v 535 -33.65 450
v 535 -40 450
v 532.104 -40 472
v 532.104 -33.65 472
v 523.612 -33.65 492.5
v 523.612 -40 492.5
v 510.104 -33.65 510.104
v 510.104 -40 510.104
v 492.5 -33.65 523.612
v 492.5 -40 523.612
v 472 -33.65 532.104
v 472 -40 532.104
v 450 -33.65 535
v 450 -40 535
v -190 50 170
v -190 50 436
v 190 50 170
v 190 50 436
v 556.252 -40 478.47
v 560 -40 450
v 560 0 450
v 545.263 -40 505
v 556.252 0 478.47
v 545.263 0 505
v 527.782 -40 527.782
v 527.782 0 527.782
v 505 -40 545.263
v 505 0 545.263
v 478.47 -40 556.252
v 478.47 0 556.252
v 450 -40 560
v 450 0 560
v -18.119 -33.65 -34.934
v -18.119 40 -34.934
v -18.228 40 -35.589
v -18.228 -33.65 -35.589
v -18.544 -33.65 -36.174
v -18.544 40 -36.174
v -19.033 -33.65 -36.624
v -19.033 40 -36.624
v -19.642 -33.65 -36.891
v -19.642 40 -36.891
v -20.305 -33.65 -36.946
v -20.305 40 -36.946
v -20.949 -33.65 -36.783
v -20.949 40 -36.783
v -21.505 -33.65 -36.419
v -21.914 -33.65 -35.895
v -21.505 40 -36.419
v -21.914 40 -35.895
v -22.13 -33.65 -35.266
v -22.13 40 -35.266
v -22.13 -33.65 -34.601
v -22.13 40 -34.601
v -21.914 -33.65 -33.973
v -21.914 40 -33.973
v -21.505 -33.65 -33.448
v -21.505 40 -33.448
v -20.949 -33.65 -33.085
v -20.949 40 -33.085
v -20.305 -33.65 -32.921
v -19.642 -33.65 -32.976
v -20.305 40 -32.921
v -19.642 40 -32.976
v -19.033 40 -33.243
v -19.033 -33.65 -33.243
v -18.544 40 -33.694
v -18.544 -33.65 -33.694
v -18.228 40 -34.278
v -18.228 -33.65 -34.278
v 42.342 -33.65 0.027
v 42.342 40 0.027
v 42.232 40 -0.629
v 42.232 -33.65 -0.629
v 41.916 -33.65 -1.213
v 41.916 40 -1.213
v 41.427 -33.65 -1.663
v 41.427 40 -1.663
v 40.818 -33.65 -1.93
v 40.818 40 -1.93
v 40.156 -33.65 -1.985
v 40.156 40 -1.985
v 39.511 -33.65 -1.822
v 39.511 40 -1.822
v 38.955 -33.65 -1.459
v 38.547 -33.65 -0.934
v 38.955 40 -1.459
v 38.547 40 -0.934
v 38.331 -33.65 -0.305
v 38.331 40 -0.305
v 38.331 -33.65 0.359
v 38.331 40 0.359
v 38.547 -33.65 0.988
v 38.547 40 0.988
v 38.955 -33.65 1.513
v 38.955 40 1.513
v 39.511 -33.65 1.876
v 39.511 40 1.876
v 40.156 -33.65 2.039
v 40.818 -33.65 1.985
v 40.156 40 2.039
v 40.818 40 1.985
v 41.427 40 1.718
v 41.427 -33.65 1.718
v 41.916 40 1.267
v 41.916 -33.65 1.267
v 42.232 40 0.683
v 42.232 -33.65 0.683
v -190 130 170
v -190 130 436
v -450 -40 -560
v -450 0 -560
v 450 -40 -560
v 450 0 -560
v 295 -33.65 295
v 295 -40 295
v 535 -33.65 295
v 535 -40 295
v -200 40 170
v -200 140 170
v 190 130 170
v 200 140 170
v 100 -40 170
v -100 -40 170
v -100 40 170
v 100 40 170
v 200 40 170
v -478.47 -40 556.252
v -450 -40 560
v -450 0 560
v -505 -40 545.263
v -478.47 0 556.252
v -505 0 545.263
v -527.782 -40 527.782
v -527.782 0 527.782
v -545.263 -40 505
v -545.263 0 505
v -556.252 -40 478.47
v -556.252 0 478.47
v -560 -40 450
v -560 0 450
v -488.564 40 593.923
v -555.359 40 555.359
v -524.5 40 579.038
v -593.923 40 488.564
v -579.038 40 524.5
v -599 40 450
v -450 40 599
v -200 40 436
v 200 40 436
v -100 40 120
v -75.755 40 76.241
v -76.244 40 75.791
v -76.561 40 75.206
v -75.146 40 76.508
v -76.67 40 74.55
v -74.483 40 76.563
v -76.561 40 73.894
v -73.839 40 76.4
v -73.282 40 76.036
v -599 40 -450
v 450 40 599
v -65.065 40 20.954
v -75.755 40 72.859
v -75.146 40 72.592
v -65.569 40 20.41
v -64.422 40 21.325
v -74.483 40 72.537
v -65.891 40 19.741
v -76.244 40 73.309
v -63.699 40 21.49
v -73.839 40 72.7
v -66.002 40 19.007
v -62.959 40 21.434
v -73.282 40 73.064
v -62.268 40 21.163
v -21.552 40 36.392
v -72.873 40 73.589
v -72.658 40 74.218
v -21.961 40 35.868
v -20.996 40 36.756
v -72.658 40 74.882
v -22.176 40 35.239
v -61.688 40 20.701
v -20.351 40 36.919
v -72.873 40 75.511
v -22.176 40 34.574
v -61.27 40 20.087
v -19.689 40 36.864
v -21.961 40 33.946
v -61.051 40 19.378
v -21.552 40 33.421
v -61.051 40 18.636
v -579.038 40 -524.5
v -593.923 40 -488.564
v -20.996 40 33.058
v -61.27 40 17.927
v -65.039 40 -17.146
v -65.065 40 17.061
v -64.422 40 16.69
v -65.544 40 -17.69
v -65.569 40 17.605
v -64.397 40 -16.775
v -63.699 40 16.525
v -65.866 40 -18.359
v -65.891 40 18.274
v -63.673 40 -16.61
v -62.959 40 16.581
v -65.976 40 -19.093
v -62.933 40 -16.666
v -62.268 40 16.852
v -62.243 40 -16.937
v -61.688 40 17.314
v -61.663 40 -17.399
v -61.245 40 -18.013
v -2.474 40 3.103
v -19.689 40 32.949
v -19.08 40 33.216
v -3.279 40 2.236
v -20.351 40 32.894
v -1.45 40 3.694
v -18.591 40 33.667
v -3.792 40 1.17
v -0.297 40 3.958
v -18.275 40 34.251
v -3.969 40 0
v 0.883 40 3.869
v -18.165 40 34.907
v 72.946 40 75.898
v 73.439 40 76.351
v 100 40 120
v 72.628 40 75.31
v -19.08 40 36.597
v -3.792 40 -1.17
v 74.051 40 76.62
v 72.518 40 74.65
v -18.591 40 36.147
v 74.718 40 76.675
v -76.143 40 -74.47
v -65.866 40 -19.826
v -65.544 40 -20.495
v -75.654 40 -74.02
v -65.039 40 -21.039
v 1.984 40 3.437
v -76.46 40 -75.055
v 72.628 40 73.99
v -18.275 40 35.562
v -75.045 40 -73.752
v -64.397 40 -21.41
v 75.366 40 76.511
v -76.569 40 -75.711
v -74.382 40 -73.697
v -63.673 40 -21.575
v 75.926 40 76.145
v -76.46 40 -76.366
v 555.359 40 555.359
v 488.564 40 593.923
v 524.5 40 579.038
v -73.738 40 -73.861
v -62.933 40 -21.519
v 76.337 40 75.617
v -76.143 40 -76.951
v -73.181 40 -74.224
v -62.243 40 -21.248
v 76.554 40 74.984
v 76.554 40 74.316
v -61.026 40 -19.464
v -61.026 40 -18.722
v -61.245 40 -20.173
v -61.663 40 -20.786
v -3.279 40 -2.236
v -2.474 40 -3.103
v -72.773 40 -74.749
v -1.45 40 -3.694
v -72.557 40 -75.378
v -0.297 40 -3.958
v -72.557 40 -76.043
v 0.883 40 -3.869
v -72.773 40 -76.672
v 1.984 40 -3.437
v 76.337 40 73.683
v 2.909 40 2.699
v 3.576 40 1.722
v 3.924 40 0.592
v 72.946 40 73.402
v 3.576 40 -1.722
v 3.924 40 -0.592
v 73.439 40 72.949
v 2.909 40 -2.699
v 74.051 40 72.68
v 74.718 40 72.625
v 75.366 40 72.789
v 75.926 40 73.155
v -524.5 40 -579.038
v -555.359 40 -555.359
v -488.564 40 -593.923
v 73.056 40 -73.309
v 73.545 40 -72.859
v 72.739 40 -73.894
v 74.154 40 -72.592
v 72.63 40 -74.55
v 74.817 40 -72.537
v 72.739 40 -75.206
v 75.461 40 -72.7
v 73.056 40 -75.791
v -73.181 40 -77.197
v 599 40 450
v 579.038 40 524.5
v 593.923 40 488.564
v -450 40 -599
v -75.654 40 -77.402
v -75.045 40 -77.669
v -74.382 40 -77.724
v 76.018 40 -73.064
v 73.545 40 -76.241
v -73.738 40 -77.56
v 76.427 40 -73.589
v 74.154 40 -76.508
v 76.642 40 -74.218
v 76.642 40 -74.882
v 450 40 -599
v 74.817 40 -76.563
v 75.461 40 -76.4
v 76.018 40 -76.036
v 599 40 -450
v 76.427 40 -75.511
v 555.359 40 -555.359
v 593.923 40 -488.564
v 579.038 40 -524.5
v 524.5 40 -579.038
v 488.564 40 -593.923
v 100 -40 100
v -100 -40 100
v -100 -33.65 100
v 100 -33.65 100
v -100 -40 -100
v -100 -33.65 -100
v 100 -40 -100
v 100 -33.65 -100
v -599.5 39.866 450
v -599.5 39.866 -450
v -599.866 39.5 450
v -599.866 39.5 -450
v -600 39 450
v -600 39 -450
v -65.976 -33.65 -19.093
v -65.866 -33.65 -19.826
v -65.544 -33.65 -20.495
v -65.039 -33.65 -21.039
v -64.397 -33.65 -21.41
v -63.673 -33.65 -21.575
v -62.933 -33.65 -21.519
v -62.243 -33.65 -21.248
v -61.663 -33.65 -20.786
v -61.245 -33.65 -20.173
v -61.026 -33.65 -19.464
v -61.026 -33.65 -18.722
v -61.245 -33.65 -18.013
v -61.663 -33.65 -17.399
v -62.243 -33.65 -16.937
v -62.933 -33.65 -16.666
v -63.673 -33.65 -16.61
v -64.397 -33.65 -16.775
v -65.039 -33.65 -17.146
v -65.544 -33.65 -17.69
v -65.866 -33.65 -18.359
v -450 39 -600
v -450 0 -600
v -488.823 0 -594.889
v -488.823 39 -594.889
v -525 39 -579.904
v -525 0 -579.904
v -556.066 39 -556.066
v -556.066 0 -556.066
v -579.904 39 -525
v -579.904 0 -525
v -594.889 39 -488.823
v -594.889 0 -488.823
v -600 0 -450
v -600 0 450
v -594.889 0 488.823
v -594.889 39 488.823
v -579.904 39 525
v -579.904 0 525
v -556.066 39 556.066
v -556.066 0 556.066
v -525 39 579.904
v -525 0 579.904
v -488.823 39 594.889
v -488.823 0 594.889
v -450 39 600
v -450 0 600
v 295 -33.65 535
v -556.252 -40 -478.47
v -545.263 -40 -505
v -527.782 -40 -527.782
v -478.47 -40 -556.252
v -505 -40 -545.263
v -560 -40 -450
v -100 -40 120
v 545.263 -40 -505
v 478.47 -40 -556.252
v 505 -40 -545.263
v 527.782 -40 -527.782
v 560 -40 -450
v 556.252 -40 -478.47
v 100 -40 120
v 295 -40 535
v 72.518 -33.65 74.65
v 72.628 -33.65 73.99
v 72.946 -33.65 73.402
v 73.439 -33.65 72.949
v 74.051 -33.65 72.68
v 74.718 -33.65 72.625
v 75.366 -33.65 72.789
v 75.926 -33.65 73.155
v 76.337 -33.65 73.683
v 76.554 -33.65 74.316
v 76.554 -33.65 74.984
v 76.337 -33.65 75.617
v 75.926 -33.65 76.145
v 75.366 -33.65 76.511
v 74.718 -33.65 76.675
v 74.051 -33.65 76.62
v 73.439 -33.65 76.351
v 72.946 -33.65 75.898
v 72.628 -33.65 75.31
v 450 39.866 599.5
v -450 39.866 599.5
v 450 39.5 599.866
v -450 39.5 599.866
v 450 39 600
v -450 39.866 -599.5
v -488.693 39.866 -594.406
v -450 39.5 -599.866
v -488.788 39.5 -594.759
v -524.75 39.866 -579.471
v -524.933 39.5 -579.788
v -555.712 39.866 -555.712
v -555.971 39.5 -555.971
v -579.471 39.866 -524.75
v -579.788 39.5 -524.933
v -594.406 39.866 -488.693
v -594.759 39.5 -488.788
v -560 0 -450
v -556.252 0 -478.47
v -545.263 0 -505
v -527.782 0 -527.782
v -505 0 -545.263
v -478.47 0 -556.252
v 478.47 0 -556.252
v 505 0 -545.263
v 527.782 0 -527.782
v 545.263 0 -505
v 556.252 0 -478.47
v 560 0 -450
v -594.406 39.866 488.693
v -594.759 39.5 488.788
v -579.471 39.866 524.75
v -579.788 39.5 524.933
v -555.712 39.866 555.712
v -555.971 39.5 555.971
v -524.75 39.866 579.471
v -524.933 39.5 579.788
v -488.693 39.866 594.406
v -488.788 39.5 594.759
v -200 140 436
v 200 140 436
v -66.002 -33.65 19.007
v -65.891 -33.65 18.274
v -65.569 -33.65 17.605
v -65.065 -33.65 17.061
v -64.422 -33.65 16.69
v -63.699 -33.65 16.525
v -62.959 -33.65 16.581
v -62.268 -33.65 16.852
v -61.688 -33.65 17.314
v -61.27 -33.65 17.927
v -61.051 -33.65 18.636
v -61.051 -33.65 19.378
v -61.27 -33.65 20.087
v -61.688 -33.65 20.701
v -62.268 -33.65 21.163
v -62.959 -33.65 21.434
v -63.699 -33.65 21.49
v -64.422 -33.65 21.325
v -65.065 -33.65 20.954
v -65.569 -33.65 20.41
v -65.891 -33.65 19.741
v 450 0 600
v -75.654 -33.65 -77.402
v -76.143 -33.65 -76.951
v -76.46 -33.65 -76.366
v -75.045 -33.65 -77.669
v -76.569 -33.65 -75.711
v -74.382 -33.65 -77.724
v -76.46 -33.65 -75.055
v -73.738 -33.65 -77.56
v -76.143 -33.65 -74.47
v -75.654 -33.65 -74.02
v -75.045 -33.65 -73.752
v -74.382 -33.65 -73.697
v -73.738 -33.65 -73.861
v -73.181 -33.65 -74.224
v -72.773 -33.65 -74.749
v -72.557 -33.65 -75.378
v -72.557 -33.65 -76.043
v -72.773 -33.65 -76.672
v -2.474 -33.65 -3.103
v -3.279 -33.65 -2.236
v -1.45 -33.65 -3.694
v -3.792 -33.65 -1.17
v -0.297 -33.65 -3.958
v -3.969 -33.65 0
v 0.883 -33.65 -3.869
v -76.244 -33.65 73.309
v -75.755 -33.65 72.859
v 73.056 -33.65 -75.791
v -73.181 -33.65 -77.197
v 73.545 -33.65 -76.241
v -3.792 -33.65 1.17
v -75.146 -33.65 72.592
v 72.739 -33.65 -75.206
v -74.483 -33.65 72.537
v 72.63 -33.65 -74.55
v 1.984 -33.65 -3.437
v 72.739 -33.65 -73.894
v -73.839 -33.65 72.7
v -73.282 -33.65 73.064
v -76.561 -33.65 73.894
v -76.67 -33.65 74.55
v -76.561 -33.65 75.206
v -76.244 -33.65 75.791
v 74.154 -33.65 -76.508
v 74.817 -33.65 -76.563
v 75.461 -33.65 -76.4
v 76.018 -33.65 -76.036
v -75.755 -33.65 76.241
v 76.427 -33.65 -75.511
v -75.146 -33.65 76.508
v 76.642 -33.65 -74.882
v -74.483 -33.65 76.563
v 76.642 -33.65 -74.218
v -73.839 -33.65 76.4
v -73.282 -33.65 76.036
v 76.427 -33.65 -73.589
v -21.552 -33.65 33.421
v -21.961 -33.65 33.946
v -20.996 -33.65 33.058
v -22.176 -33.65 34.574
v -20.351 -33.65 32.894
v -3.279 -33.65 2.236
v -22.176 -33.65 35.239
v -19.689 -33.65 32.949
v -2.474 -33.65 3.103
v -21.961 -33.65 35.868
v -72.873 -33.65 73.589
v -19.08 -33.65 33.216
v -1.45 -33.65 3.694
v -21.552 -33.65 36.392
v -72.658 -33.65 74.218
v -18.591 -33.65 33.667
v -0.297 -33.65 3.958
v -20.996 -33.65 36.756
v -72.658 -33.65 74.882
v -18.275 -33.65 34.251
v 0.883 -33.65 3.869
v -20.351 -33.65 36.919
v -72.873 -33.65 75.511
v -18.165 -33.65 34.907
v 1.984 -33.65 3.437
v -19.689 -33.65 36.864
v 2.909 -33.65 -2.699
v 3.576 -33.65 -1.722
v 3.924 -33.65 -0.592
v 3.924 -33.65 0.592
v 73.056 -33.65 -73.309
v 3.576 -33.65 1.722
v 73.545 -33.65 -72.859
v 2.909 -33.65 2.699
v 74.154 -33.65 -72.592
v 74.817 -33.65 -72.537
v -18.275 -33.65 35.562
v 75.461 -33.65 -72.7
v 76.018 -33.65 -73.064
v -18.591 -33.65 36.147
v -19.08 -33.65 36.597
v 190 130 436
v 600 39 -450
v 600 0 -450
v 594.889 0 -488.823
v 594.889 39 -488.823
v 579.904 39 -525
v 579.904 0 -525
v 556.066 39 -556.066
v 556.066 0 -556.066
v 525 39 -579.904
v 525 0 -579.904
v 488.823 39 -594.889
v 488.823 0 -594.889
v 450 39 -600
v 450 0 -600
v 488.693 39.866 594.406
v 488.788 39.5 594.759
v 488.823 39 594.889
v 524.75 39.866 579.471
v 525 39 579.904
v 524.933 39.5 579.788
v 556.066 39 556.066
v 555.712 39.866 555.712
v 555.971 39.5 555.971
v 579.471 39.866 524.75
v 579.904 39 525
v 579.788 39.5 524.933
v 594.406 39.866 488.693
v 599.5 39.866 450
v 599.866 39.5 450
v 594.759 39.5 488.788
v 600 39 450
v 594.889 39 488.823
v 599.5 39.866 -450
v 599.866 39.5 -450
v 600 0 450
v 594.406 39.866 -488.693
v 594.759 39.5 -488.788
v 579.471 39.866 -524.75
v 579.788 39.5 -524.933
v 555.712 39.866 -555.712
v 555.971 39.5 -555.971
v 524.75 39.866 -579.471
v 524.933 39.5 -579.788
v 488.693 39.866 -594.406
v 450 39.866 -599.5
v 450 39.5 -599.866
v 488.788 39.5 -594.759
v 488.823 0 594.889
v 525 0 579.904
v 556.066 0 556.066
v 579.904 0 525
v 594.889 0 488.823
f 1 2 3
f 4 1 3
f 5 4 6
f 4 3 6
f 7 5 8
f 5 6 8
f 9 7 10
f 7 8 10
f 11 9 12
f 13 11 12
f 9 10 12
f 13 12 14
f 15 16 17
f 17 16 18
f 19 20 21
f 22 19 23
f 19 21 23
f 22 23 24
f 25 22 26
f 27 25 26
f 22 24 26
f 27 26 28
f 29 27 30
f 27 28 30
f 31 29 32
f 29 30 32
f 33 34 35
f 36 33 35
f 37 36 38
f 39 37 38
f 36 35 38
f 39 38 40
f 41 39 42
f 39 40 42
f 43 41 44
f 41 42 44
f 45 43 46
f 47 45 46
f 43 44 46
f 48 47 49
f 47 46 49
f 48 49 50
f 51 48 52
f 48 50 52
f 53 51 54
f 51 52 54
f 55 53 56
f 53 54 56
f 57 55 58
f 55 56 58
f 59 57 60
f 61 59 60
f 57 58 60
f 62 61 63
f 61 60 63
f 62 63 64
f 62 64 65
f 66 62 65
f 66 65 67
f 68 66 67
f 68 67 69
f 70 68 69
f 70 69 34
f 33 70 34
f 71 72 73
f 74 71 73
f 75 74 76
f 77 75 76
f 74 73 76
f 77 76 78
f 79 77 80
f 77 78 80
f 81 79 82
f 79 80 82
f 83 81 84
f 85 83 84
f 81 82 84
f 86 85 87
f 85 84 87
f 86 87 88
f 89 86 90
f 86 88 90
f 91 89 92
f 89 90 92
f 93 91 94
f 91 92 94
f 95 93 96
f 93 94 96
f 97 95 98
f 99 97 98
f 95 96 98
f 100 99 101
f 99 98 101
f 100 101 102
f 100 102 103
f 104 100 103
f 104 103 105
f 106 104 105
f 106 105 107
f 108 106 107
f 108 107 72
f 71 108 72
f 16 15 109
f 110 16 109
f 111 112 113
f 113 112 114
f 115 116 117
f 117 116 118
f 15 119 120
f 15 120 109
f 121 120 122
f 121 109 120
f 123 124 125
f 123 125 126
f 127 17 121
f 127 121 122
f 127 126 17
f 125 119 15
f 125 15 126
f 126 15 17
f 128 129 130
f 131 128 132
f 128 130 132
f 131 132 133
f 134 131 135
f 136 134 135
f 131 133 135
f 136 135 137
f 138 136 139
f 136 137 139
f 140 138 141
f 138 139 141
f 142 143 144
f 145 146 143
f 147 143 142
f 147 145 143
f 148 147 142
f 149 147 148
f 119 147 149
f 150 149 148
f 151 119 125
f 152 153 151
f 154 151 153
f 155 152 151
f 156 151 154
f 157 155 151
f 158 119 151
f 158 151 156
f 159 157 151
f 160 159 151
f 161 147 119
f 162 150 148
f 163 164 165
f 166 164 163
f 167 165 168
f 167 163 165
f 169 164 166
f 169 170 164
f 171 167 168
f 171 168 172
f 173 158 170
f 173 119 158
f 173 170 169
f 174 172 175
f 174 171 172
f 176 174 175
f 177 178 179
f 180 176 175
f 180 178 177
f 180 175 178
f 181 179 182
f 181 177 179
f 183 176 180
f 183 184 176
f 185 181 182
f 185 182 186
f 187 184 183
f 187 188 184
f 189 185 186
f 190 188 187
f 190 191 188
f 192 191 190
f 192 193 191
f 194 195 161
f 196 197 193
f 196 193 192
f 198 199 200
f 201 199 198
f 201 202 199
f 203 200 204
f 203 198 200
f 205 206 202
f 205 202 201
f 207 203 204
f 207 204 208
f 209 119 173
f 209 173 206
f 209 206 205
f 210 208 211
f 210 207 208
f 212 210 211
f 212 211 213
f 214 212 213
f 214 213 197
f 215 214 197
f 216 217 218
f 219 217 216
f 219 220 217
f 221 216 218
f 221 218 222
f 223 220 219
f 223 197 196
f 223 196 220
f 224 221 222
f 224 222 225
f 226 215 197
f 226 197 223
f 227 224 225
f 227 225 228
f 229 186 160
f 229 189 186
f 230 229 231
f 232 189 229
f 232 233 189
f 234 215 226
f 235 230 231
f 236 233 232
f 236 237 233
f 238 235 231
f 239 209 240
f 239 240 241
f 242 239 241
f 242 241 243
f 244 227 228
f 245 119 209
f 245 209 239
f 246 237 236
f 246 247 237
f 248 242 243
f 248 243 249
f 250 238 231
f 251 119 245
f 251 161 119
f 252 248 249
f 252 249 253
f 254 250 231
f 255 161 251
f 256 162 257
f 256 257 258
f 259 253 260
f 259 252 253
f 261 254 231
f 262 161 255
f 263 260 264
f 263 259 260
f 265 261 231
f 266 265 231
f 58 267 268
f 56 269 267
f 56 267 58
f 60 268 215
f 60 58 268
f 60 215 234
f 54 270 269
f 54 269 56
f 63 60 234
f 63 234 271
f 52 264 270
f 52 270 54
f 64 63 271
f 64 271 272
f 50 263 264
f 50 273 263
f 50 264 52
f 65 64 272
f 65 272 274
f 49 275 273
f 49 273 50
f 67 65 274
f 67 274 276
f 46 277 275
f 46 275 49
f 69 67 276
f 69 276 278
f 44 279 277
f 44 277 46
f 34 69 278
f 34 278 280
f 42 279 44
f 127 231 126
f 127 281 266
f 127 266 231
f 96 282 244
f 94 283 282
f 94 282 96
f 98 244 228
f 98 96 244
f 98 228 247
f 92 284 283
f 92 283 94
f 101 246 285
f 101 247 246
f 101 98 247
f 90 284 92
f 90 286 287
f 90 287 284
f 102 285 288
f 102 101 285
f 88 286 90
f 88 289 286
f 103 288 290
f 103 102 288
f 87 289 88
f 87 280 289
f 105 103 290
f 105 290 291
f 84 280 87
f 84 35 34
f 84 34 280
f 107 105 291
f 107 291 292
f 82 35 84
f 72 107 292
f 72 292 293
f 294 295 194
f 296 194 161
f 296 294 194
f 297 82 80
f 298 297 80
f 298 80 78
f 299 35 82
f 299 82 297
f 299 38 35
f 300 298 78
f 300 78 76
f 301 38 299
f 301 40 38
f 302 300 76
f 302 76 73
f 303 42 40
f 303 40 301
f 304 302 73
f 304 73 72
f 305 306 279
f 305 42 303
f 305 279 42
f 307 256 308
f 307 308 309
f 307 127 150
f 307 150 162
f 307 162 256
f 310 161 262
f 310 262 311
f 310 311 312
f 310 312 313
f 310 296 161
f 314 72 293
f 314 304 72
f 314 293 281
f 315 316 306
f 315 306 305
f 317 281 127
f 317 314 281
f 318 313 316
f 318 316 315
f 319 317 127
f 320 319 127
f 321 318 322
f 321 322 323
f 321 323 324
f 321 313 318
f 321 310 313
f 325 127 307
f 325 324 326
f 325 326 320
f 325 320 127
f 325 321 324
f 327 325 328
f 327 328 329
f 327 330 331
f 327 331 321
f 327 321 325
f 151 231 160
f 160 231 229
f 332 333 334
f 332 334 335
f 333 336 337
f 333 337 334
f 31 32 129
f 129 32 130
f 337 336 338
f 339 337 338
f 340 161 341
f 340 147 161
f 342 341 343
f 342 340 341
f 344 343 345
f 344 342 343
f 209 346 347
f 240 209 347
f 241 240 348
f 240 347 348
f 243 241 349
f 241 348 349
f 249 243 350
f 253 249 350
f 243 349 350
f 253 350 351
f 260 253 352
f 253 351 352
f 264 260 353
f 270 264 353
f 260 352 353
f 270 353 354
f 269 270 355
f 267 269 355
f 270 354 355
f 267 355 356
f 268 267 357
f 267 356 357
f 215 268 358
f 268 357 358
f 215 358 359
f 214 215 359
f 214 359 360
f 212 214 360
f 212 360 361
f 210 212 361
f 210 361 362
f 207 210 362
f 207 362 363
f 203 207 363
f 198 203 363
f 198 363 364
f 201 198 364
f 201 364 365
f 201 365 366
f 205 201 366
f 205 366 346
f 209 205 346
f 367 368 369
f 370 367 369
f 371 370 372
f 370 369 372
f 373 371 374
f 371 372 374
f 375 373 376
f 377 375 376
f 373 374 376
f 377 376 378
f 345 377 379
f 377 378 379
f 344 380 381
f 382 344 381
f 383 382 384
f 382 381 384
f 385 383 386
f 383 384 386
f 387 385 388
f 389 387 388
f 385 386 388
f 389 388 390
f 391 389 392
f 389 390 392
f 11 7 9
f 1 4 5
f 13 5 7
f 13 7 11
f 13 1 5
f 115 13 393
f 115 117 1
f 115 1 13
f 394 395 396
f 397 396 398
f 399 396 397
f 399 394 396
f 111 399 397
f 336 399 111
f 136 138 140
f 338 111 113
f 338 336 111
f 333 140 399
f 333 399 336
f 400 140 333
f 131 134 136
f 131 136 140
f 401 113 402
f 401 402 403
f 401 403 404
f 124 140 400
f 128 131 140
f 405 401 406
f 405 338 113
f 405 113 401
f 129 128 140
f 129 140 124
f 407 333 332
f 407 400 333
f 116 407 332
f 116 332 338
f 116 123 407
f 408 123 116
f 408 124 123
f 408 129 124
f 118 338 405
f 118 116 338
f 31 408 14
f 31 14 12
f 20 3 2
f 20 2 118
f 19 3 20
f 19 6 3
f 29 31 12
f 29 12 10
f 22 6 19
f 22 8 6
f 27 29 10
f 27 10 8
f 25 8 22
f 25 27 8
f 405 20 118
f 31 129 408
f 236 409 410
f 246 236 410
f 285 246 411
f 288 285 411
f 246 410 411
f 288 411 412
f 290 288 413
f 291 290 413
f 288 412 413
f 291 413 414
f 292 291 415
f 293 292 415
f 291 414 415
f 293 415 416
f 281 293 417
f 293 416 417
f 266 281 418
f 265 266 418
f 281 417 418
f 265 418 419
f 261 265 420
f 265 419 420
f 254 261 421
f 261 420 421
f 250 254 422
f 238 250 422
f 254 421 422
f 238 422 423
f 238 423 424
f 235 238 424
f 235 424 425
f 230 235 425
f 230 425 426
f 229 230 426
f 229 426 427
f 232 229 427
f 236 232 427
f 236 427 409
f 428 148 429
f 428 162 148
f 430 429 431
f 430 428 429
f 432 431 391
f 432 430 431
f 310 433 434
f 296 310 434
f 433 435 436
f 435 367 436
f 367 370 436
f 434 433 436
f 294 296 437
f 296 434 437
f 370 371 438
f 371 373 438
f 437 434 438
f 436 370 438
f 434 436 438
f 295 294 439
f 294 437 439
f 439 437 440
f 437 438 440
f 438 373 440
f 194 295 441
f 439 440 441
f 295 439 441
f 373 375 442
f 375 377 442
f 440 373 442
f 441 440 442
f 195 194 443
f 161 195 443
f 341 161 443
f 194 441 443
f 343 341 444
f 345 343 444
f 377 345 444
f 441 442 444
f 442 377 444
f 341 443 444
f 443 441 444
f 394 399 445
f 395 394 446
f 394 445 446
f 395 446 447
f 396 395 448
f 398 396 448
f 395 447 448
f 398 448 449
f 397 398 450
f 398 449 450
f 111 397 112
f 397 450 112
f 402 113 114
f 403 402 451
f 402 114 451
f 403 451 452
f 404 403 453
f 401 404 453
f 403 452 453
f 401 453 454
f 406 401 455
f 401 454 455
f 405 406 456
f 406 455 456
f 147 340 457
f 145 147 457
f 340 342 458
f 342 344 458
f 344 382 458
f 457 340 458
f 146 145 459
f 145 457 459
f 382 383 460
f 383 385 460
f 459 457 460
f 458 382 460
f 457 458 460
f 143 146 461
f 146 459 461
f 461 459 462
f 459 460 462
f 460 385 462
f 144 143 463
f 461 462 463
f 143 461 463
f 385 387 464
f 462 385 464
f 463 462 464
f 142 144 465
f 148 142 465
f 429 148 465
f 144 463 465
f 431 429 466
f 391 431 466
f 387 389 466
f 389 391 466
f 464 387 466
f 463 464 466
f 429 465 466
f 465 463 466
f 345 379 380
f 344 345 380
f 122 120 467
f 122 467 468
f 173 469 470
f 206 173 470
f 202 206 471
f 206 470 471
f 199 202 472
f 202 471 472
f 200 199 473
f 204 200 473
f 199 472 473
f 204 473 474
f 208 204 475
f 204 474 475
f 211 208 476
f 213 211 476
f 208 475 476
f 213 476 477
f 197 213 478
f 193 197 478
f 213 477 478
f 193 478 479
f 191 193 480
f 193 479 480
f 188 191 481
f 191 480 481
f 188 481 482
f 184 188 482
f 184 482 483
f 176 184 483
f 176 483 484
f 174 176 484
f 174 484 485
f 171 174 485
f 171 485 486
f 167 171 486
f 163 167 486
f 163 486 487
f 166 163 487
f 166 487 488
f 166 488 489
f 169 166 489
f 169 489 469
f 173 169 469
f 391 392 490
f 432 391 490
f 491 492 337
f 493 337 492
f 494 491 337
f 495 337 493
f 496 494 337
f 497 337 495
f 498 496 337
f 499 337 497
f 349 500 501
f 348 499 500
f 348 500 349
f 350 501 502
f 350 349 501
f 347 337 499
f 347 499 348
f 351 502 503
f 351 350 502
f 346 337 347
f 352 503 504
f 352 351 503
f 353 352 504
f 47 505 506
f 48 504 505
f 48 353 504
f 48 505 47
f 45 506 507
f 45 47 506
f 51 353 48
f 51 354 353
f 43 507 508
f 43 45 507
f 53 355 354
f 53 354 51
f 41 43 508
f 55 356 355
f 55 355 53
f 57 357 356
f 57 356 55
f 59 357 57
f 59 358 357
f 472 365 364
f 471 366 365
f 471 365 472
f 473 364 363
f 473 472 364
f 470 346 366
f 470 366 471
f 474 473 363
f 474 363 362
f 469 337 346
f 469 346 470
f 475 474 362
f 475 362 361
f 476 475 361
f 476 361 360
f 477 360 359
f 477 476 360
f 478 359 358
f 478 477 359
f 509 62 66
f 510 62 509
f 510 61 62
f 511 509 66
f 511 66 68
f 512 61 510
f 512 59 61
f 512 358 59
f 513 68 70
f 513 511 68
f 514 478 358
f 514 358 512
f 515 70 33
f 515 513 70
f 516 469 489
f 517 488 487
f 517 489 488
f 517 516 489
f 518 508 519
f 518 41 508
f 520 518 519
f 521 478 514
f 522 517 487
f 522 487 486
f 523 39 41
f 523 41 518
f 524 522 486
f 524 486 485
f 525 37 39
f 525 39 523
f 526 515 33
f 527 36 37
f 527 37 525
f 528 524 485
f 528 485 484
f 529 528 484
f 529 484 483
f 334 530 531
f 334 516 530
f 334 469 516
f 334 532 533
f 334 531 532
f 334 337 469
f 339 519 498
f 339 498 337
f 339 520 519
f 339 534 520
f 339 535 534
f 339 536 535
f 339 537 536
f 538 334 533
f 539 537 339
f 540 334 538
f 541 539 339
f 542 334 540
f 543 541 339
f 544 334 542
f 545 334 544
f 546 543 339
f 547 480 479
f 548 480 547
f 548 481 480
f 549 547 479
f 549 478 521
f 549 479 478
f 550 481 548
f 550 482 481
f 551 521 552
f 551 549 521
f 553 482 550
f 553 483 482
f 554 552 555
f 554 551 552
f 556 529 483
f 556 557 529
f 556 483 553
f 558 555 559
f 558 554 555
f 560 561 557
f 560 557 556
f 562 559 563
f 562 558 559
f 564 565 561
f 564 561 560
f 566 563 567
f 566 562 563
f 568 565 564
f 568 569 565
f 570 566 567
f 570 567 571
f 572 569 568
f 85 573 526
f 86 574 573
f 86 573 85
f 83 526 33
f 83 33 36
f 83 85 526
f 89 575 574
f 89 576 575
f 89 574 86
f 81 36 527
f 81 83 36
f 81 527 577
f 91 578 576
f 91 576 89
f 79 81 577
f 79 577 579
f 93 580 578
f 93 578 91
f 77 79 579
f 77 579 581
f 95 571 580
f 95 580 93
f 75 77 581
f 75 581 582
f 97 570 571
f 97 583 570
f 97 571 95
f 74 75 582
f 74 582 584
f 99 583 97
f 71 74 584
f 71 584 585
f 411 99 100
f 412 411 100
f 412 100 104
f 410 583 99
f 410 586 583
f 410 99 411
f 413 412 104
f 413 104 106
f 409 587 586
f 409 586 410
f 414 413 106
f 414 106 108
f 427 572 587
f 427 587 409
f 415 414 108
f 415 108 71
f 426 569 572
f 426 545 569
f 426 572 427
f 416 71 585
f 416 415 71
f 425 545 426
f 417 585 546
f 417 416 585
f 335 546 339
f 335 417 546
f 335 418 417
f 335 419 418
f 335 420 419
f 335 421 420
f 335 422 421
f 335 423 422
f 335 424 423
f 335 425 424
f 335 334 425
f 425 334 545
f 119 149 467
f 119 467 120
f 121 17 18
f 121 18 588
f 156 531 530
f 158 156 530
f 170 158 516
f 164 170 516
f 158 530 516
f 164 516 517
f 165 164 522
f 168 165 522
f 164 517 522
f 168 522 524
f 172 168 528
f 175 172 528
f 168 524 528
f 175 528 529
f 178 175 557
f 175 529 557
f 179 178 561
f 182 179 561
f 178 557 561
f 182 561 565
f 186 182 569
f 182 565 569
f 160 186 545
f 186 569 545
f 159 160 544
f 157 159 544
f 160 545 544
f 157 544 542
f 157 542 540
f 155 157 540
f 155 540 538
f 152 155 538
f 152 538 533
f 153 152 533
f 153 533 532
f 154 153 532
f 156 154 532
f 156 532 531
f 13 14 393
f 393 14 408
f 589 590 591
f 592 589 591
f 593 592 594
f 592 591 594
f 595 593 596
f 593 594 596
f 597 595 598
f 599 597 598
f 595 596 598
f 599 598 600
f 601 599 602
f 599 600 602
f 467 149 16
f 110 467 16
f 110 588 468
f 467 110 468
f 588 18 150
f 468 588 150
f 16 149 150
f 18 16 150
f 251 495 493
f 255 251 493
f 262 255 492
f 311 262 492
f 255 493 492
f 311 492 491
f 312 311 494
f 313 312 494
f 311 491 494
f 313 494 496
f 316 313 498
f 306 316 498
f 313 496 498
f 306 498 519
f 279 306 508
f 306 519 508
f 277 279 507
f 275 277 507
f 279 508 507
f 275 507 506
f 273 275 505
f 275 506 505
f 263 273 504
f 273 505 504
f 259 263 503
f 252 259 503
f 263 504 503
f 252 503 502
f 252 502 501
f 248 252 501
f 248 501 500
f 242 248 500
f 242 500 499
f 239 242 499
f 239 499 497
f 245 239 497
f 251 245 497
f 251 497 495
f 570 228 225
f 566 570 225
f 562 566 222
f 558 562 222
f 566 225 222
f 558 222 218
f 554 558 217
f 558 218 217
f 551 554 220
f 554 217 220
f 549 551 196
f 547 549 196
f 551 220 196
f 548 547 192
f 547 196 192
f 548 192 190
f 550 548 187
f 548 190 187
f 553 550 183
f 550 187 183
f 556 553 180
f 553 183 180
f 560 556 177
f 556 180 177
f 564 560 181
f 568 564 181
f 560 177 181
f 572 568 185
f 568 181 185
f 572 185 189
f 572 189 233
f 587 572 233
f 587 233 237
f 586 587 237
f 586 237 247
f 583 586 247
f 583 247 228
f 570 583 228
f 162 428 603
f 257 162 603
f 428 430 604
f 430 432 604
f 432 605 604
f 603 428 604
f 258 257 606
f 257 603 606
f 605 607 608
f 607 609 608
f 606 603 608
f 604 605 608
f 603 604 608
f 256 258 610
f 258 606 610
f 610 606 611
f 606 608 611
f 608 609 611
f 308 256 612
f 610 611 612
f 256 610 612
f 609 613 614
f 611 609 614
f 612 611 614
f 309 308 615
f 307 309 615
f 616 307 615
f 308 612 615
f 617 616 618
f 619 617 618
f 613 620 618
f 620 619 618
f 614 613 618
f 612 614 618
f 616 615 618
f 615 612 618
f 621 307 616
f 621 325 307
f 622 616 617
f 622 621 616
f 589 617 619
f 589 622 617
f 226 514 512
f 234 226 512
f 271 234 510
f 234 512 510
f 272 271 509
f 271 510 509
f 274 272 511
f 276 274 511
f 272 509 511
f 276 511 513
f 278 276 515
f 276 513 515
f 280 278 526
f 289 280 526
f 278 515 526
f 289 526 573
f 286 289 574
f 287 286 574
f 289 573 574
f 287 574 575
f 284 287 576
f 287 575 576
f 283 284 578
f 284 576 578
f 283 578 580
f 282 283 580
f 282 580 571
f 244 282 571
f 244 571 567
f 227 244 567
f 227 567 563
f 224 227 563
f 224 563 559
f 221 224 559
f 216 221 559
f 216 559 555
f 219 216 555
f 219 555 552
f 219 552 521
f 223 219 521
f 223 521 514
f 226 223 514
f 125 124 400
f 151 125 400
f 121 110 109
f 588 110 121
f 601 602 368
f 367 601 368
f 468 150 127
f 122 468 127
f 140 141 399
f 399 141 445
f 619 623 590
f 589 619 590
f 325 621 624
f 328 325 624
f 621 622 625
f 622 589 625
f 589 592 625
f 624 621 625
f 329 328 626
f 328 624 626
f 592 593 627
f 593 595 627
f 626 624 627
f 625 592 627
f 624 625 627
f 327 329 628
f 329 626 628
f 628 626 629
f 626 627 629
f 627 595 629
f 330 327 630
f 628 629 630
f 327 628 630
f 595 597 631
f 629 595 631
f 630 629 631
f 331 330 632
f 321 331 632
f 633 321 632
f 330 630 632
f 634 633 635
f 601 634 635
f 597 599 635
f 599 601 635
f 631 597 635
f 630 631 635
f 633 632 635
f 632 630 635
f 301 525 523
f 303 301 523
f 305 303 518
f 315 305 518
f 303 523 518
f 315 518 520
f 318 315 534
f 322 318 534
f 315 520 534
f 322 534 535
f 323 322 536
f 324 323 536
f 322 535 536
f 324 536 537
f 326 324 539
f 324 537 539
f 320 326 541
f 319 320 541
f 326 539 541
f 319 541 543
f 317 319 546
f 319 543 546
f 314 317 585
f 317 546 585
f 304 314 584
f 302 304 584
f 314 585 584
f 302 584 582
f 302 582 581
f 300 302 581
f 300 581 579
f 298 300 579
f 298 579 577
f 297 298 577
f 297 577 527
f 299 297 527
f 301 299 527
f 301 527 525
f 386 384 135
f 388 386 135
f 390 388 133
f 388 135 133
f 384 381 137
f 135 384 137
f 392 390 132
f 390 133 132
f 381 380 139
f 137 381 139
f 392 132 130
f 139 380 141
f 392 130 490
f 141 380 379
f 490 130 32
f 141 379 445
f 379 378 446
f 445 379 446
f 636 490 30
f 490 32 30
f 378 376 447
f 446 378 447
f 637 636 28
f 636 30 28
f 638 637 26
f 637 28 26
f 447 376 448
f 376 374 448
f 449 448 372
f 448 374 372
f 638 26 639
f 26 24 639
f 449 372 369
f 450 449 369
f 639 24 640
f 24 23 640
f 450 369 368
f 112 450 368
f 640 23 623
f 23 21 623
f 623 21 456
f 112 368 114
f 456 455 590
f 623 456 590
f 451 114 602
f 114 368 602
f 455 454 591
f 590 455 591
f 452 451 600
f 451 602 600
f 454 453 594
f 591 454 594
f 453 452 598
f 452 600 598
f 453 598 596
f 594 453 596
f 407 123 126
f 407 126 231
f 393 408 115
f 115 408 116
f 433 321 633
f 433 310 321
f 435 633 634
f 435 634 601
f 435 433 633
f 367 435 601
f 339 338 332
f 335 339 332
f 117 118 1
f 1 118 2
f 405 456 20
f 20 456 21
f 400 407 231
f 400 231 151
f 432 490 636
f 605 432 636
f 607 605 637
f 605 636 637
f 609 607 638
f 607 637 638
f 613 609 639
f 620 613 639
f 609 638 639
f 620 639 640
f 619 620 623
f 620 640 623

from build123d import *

# Parameters (mm, degrees)
BOSS_EXTRUDE1_DEPTH    = 40
BOSS_EXTRUDE2_DEPTH    = 40
SKETCH3_W              = 200
SKETCH3_H              = 200
CUT_EXTRUDE1_DEPTH     = 6.35
SKETCH4_R              = 2.4892
SKETCH4_R_2            = 3.96875
CUT_EXTRUDE2_DEPTH     = 81
F_10_32_TAPPED_HOLE1_D = 4.0386
SKETCH10_R             = 2.02
SKETCH10_R_2           = 2.032
CUT_EXTRUDE3_DEPTH     = 81
SKETCH11_W             = 200
SKETCH11_H             = 50
CUT_EXTRUDE4_DEPTH     = 81
FILLET1_R              = 1
SKETCH12_W             = 400
SKETCH12_H             = 266
BOSS_EXTRUDE3_DEPTH    = 100
SKETCH13_W             = 380
SKETCH13_H             = 80
CUT_EXTRUDE5_DEPTH     = 266
CUT_EXTRUDE6_DEPTH     = 6.35


with BuildPart() as part:
    # Sketch1 → Boss-Extrude1 (new body)
    with BuildSketch(Plane(origin=(0, 0, 0), x_dir=(1, 0, 0), z_dir=(0, 1, 0))):
        with BuildLine():
            Line((-450, -600), (450, -600))
            ThreePointArc((450, -600), (556.066017178, -556.066017178), (600, -450))
            Line((600, -450), (600, 450))
            ThreePointArc((600, 450), (556.066017178, 556.066017178), (450, 600))
            Line((450, 600), (-450, 600))
            ThreePointArc((-450, 600), (-556.066017178, 556.066017178), (-600, 450))
            Line((-600, 450), (-600, -450))
            ThreePointArc((-600, -450), (-556.066017178, -556.066017178), (-450, -600))
        make_face()
    extrude(amount=BOSS_EXTRUDE1_DEPTH)

    # Sketch2 → Boss-Extrude2 (add)
    with BuildSketch(Plane.XZ):
        with BuildLine():
            Line((560, -450), (560, 450))
            ThreePointArc((560, 450), (527.781745931, 527.781745931), (450, 560))
            Line((450, 560), (-450, 560))
            ThreePointArc((-450, 560), (-527.781745931, 527.781745931), (-560, 450))
            Line((-560, 450), (-560, -450))
            ThreePointArc((-560, -450), (-527.781745931, -527.781745931), (-450, -560))
            Line((-450, -560), (450, -560))
            ThreePointArc((450, -560), (527.781745931, -527.781745931), (560, -450))
        make_face()
    extrude(amount=BOSS_EXTRUDE2_DEPTH)

    # Sketch3 → Cut-Extrude1 (cut)
    with BuildSketch(Plane.XZ.offset(40)):
        Rectangle(SKETCH3_W, SKETCH3_H)
    extrude(amount=-CUT_EXTRUDE1_DEPTH, mode=Mode.SUBTRACT)

    # Sketch4 → Cut-Extrude2 (cut, through all)
    with BuildSketch(Plane(origin=(0, -40, 0), x_dir=(-1, 0, 0), z_dir=(0, -1, 0))):
        with Locations((63.487218193, 19.092554208)):
            Circle(SKETCH4_R)
        with Locations((63.512753284, -19.007437235)):
            Circle(SKETCH4_R)
        Circle(SKETCH4_R_2)
    extrude(amount=-CUT_EXTRUDE2_DEPTH, mode=Mode.SUBTRACT)

    # #10-32 Tapped Hole1 (through all)
    with Locations(Plane(origin=(0, -40, 0), x_dir=(-1, 0, 0), z_dir=(0, -1, 0))):
        with Locations((20.137841448, 34.93381382), (-40.322490944, -0.027024638), (20.184649496, -34.906789182)):
            Hole(F_10_32_TAPPED_HOLE1_D / 2)

    # Sketch10 → Cut-Extrude3 (cut, through all)
    with BuildSketch(Plane(origin=(0, -40, 0), x_dir=(-1, 0, 0), z_dir=(0, -1, 0))):
        with Locations((-74.649981089, 74.549985402)):
            Circle(SKETCH10_R)
        with Locations((74.549274576, 75.710578627)):
            Circle(SKETCH10_R)
        with Locations((74.649981089, -74.549985402)):
            Circle(SKETCH10_R)
        with Locations((-74.549985402, -74.649981089)):
            Circle(SKETCH10_R_2)
    extrude(amount=-CUT_EXTRUDE3_DEPTH, mode=Mode.SUBTRACT)

    # Sketch11 → Cut-Extrude4 (cut, through all)
    with BuildSketch(Plane(origin=(0, -40, 0), x_dir=(-1, 0, 0), z_dir=(0, -1, 0))):
        with Locations((0, -145)):
            Rectangle(SKETCH11_W, SKETCH11_H)
    extrude(amount=-CUT_EXTRUDE4_DEPTH, mode=Mode.SUBTRACT)

    # Fillet1
    fillet1_edges = [part.edges().sort_by_distance(p)[0] for p in [
        (-556.066017178, 40, -556.066017178),
        (-600, 40, 0),
        (-556.066017178, 40, 556.066017178),
        (0, 40, 600),
        (556.066017178, 40, 556.066017178),
        (600, 40, 0),
        (556.066017178, 40, -556.066017178),
        (0, 40, -600),
    ]]
    fillet(fillet1_edges, radius=FILLET1_R)

    # Sketch12 → Boss-Extrude3 (add)
    with BuildSketch(Plane(origin=(0, 40, 0), x_dir=(1, 0, 0), z_dir=(0, 1, 0))):
        with Locations((0, -303)):
            Rectangle(SKETCH12_W, SKETCH12_H)
    extrude(amount=BOSS_EXTRUDE3_DEPTH)

    # Sketch13 → Cut-Extrude5 (cut)
    with BuildSketch(Plane.XY.offset(436)):
        with Locations((0, 90)):
            Rectangle(SKETCH13_W, SKETCH13_H)
    extrude(amount=-CUT_EXTRUDE5_DEPTH, mode=Mode.SUBTRACT)

    # Sketch14 → Cut-Extrude6 (cut)
    with BuildSketch(Plane(origin=(0, -40, 0), x_dir=(-1, 0, 0), z_dir=(0, -1, 0))):
        with BuildLine():
            Line((-450, -535), (-295, -535))
            Line((-295, -535), (-295, -295))
            Line((-295, -295), (-535, -295))
            Line((-535, -295), (-535, -450))
            ThreePointArc((-535, -450), (-510.104076401, -510.104076401), (-450, -535))
        make_face()
    extrude(amount=-CUT_EXTRUDE6_DEPTH, mode=Mode.SUBTRACT)


solid = part.part
